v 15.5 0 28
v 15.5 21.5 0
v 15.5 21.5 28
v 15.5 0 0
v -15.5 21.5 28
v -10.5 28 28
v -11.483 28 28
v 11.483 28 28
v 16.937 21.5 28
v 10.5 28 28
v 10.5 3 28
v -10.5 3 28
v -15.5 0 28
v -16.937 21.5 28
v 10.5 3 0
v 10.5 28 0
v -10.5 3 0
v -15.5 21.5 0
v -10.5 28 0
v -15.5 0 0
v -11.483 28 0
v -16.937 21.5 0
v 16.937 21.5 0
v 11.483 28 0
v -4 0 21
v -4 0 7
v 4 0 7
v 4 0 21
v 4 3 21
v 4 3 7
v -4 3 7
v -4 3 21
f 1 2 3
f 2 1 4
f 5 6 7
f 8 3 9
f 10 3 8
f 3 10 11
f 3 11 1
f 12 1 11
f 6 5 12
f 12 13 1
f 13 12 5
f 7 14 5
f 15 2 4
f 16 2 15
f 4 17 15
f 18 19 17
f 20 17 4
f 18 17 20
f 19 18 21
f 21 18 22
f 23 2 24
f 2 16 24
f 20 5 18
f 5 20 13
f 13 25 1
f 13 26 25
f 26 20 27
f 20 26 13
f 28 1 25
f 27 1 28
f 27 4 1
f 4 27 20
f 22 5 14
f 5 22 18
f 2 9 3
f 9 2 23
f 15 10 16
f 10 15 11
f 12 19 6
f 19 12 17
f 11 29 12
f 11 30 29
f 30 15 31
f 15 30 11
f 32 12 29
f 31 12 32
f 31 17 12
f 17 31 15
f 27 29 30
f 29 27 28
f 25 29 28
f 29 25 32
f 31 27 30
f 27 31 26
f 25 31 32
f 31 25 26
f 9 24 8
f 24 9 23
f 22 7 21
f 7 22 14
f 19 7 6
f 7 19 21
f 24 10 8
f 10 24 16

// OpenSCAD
	difference(){
		translate([-31/2,0,0]){
			difference(){
				union(){
					cube([31,30,28]); //cambiar por 31
					translate([-2,21.5,0])cube([3,5,28]);
					translate([30,21.5,0])cube([3,5,28]);	
				}
				translate([5,3,-1])cube([21,50,30]);
				//translate([27/2,20,14])rotate([90,45,0])cylinder(r=6,h=40, $fn=4);
				translate([11.5,-15,7])cube([8,30,14]);
			}
		}
		translate([14,25,0])rotate([0,0,40])translate([0,-8,0])cube(100);
		mirror([1,0,0])translate([14,25,0])rotate([0,0,40])translate([0,-8,0])cube(100);
		translate([-50,28,0])cube(200);
	}
	//translate([11.5,22,0])cube([3,5,28]);
	//mirror([1,0,0])translate([11.5,22,0])cube([3,5,28]);
